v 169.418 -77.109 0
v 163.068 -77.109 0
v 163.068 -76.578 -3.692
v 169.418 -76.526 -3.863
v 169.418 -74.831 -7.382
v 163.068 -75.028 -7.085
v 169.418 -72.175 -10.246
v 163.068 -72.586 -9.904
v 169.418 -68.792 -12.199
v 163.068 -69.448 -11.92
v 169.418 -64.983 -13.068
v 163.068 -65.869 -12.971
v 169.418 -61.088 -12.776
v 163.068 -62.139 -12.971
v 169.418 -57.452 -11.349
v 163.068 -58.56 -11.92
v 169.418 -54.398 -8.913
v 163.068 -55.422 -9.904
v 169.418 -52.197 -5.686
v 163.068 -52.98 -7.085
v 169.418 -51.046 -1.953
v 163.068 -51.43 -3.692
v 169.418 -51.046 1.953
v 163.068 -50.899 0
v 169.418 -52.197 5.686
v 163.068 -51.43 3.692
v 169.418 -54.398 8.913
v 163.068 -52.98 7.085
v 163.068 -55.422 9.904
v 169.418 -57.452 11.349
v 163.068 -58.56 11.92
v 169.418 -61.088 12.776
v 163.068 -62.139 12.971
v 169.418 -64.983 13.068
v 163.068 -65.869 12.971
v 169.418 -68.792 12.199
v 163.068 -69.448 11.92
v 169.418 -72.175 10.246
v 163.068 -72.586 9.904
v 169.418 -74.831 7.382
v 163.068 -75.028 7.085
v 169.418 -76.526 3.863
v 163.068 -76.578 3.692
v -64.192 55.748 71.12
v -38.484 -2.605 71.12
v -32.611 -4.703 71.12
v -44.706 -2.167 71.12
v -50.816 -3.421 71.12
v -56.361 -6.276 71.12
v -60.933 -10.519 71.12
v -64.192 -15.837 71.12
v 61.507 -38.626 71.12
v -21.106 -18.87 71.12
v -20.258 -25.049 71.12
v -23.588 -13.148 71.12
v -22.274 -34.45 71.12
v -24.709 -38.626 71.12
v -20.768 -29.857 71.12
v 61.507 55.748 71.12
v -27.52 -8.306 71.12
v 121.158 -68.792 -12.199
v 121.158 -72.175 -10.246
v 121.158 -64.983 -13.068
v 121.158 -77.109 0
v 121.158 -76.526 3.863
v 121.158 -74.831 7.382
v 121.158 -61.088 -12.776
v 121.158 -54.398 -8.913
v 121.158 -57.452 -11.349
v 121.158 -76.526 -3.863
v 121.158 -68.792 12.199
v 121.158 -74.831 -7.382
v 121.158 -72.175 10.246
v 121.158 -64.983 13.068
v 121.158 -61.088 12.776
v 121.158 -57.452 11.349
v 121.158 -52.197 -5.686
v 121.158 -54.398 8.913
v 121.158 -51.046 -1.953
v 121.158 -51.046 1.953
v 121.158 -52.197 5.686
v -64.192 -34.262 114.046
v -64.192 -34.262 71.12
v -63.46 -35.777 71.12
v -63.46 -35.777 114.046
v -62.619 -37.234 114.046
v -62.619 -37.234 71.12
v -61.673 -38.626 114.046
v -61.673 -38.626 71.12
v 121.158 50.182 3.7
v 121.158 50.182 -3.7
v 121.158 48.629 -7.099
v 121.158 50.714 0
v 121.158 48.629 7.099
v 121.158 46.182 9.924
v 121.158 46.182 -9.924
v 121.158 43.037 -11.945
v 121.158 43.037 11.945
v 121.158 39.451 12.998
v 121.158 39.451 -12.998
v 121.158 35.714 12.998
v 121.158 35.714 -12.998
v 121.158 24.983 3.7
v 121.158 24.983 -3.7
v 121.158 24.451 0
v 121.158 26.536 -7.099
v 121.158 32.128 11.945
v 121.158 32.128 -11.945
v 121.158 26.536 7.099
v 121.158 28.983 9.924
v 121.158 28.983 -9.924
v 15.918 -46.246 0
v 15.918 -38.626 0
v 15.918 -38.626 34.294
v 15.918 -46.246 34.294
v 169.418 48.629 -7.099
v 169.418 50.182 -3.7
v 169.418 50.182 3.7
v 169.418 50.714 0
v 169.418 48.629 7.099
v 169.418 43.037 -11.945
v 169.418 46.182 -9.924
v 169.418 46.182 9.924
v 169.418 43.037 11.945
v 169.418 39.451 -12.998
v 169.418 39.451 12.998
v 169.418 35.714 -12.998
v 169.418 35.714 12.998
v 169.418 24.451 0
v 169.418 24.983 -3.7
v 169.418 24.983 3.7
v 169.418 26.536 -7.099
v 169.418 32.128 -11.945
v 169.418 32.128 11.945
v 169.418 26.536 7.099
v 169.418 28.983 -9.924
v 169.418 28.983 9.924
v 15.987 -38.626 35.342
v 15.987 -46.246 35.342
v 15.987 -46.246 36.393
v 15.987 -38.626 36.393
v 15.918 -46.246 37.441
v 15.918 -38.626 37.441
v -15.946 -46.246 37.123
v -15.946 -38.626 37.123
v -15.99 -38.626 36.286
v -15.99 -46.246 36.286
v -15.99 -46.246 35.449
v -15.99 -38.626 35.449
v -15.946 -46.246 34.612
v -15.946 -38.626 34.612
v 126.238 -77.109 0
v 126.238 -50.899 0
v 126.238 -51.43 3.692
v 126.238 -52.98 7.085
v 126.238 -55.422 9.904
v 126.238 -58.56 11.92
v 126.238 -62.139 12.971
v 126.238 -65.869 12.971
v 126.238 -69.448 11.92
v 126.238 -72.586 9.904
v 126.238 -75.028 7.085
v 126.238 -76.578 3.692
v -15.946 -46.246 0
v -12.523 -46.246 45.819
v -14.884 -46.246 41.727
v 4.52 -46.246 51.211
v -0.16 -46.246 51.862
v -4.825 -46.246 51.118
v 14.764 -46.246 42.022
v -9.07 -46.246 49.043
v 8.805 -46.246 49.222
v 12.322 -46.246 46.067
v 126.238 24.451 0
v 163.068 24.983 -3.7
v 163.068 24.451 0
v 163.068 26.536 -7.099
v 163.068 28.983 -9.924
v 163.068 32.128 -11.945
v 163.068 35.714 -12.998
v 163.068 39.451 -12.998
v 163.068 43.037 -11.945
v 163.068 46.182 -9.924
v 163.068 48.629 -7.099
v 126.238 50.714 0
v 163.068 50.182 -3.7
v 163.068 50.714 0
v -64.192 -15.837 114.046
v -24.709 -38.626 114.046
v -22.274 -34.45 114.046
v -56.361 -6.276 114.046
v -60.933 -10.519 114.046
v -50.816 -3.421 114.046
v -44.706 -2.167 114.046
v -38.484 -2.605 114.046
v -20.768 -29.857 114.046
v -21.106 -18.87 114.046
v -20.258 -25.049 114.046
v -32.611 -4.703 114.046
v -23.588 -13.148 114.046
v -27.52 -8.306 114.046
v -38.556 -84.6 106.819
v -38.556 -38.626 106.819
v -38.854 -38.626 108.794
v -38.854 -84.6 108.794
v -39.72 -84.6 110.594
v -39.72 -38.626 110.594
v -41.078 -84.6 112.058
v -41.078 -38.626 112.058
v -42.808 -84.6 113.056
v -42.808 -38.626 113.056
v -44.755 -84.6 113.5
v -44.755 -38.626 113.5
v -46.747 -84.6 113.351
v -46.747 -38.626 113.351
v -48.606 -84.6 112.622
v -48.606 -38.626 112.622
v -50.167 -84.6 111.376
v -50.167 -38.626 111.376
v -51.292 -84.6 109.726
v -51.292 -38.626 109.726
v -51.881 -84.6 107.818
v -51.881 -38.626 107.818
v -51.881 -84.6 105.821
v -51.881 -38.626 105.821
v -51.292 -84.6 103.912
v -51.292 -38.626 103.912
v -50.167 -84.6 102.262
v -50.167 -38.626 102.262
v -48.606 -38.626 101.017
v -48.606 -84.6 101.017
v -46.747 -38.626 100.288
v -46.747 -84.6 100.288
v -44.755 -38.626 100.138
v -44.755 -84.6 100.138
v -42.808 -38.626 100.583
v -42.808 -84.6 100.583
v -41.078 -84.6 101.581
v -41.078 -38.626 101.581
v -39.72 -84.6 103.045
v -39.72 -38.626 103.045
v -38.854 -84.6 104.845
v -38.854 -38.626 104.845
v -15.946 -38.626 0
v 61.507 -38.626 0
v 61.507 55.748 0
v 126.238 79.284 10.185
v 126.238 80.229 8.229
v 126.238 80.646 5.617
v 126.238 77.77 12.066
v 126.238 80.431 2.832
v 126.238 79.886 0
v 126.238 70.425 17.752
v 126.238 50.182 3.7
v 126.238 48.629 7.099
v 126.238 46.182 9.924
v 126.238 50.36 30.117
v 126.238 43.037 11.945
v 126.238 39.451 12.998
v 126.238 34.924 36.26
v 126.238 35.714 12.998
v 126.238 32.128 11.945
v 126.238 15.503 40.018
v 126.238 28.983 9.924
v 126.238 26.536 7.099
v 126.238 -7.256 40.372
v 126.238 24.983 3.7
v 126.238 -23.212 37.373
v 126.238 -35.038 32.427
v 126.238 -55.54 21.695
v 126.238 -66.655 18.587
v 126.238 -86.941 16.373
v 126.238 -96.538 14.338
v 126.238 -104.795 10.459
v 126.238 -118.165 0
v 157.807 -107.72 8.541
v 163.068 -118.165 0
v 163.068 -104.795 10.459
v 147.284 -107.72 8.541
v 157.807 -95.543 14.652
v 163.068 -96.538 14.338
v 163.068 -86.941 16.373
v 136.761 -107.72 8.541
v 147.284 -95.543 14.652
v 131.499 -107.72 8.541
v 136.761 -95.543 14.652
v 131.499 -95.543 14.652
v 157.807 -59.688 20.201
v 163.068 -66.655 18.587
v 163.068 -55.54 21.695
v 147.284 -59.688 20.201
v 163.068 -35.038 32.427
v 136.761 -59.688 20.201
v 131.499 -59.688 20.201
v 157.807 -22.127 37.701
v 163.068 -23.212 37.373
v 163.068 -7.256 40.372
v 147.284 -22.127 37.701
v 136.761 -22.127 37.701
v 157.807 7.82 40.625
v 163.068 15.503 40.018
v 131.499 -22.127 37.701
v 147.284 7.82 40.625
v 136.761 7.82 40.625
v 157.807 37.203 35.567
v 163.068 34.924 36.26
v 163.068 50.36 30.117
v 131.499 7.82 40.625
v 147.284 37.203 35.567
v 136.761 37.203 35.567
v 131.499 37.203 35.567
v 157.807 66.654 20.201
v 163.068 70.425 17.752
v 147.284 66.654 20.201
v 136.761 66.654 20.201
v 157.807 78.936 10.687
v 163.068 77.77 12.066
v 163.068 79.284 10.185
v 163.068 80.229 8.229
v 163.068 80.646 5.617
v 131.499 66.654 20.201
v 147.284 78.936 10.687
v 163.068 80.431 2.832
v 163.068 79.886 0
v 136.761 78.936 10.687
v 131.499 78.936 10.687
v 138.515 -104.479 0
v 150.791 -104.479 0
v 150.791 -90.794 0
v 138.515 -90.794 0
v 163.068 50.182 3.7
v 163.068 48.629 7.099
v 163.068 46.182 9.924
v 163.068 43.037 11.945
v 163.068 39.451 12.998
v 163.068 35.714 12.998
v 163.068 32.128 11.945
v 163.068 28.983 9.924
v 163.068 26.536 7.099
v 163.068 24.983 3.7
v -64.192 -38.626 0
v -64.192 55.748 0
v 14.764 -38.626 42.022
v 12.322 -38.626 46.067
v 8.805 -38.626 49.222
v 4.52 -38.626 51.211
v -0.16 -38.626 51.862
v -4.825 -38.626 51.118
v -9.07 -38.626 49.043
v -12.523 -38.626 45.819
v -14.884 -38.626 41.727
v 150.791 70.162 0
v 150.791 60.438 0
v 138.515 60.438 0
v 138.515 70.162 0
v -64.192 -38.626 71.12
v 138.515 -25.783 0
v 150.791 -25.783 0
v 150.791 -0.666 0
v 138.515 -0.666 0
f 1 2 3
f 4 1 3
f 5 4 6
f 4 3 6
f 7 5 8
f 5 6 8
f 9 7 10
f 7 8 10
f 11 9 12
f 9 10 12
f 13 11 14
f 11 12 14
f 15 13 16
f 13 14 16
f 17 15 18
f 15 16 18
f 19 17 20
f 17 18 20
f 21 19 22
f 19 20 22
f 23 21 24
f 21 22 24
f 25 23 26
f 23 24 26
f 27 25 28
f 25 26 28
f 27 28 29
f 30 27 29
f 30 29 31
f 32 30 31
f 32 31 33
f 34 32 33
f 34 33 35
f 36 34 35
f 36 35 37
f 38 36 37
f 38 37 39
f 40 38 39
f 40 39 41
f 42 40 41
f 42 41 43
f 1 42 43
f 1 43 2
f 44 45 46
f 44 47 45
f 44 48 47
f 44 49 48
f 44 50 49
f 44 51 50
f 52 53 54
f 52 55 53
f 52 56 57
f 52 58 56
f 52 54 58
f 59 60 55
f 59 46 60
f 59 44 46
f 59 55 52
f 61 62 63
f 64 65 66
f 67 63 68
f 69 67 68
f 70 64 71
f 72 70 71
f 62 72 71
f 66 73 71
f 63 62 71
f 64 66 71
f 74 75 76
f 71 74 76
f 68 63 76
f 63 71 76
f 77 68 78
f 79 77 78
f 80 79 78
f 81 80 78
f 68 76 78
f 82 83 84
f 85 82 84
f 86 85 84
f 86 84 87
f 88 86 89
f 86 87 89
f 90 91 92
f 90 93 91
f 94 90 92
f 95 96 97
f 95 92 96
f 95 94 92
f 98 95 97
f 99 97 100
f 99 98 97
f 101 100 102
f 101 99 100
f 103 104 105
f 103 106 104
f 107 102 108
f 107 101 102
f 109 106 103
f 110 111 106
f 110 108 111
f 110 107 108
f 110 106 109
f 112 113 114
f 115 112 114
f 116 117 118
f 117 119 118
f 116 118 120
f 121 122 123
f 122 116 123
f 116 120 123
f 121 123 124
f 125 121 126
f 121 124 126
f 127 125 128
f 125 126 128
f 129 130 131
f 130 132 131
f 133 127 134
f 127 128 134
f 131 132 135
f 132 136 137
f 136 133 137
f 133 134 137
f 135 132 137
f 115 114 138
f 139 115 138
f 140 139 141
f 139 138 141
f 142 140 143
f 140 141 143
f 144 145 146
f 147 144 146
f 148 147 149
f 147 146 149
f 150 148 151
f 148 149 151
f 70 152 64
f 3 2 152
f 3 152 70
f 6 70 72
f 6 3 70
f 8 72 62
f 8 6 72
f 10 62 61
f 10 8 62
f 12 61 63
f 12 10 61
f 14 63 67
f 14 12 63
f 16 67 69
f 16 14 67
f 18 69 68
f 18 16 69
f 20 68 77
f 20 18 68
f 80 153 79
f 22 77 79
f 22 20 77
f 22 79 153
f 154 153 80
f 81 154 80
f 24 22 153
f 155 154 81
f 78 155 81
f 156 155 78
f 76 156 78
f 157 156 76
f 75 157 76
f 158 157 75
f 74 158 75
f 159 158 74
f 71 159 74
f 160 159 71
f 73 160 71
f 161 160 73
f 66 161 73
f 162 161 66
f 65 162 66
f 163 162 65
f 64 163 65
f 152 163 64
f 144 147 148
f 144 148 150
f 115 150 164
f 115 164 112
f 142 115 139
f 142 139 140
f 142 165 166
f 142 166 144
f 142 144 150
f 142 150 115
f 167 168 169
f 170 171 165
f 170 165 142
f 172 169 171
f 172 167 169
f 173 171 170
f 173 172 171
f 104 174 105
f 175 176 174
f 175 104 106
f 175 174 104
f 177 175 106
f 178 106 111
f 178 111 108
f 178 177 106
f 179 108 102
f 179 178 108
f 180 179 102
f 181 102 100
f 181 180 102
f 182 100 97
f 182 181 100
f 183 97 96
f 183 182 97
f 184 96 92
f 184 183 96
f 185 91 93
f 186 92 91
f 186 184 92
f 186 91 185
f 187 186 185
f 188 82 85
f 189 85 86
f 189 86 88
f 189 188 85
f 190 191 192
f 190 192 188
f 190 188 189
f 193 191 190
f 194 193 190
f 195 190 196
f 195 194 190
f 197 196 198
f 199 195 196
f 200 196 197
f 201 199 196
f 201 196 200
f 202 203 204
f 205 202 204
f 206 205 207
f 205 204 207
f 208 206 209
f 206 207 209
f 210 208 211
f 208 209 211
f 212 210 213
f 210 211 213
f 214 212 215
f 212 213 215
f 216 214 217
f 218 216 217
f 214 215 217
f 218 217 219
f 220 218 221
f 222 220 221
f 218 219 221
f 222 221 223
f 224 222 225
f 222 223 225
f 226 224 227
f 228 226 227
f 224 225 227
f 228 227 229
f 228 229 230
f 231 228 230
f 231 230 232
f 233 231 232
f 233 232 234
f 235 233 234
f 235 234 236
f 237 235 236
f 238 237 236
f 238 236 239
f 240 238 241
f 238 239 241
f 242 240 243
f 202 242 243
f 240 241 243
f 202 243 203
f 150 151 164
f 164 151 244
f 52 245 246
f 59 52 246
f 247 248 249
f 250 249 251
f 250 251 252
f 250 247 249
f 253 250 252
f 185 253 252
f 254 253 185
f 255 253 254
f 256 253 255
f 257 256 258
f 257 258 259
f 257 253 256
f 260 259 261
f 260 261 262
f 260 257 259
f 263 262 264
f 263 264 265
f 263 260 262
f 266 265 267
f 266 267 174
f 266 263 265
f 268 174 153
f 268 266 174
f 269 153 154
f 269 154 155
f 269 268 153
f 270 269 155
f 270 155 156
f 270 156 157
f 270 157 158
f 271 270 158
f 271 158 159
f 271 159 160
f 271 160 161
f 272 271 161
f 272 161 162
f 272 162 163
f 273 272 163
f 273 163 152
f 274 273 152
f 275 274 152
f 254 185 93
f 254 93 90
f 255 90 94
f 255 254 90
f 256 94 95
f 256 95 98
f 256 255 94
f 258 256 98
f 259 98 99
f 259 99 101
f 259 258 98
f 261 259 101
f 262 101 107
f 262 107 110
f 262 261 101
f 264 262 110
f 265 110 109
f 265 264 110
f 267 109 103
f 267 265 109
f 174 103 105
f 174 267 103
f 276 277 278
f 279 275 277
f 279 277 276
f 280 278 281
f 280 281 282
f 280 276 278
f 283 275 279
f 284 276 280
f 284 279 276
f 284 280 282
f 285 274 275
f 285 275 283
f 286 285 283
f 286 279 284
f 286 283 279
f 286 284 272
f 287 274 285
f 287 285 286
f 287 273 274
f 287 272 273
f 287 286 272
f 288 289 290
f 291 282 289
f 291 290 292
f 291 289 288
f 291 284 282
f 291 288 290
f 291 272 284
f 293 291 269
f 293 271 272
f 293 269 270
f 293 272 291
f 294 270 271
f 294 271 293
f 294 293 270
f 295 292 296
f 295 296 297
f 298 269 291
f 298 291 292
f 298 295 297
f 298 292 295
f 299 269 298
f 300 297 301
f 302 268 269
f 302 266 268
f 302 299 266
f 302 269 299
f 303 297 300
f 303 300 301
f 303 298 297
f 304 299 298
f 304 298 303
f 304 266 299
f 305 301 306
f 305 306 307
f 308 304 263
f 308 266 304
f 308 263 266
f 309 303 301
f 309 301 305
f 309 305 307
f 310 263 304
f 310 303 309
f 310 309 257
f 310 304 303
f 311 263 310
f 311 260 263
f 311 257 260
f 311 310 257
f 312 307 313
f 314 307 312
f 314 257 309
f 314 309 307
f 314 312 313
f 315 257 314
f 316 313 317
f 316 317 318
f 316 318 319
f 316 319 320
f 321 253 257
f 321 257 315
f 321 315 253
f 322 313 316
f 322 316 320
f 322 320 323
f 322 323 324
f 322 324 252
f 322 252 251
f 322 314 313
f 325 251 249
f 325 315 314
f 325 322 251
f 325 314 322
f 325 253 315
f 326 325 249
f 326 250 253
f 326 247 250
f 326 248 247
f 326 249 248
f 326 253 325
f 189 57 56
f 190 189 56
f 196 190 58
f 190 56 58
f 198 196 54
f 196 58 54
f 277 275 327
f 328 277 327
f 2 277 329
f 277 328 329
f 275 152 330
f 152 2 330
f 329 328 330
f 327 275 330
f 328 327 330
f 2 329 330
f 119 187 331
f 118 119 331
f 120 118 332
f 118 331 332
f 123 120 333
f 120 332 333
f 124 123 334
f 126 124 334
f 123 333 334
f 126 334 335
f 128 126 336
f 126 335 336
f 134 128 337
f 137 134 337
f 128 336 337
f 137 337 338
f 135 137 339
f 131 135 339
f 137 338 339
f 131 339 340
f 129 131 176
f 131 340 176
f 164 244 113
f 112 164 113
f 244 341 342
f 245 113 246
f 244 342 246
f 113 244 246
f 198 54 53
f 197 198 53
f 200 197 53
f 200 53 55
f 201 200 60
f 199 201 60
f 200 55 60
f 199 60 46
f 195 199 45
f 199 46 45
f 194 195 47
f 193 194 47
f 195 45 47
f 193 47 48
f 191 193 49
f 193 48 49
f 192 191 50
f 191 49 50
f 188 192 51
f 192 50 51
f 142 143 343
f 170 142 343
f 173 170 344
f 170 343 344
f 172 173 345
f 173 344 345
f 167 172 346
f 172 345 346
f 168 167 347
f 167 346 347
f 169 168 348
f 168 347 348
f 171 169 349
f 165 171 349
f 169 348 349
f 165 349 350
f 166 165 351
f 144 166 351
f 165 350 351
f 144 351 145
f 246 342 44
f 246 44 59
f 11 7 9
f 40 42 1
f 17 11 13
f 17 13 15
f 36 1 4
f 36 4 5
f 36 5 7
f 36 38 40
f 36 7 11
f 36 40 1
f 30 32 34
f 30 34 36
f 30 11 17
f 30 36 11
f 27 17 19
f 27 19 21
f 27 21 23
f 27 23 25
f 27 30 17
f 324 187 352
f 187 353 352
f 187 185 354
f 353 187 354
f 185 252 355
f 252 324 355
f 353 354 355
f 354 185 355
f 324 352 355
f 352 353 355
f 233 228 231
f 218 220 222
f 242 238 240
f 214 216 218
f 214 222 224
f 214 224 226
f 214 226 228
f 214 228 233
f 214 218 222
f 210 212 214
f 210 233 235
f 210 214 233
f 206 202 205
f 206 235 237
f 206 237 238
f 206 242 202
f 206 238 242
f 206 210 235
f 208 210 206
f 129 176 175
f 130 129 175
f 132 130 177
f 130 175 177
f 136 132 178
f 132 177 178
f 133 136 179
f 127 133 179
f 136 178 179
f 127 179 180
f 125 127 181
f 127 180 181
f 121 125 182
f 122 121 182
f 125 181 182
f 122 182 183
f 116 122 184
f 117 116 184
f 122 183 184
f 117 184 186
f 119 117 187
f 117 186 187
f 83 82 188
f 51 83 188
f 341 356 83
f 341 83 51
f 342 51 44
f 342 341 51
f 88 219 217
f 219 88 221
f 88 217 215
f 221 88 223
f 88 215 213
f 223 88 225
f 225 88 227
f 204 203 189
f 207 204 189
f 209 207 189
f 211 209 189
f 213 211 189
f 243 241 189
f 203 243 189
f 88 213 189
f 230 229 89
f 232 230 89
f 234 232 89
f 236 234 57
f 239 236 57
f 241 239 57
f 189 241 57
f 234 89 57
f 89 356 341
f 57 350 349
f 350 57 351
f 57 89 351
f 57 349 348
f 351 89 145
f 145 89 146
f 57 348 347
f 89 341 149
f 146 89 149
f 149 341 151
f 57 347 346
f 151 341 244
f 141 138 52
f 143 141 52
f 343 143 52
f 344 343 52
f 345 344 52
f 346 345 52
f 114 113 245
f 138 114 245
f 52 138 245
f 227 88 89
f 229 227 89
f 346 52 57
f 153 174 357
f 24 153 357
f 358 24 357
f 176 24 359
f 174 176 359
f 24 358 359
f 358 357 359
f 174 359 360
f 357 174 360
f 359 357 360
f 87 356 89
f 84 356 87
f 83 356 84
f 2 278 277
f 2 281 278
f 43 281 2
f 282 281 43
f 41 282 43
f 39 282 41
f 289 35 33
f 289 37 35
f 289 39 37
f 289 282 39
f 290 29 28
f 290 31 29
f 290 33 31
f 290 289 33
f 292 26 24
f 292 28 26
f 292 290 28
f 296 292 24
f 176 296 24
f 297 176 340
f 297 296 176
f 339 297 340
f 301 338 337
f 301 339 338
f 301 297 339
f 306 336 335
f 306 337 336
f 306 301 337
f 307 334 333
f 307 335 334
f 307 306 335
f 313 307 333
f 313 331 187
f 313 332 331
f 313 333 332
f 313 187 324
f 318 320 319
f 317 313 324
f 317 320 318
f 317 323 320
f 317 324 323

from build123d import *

# Parameters (mm, degrees)
F0_W           = 125.6985701621
F0_H           = 94.37424317
F1_DEPTH       = 71.12
F3_DEPTH       = 7.62
F5_DEPTH       = 42.926
F6_R           = 6.6998463105
F7_DEPTH       = 45.974
F10_DEPTH      = 36.83
F12_DEPTH      = 41.91
F12_DEPTH_BACK = 6.35


with BuildPart() as f1:
    # F0 (on Top) → F1 (new body)
    with BuildSketch(Plane.XY):
        with Locations((-1.3424884528, 8.5609909147)):
            Rectangle(F0_W, F0_H)
    extrude(amount=F1_DEPTH)

    # F2 (on face) → F3 (join)
    with BuildSketch(Plane.XZ.offset(38.6261306703)):
        with BuildLine():
            Line((15.9182339085, 37.4408234342), (15.9182339085, 34.2940743581))
            ThreePointArc((15.9182339085, 34.2940743581), (15.9958018931, 35.8674488962), (15.9182339085, 37.4408234342))
        make_face()
        with BuildLine():
            Line((15.9182339085, 0), (15.9182339085, 34.2940743581))
            Line((15.9182339085, 34.2940743581), (15.9182339085, 37.4408234342))
            ThreePointArc((15.9182339085, 37.4408234342), (-0.1595166751, 51.8624553868), (-15.9464469133, 37.1230400097))
            Line((-15.9464469133, 37.1230400097), (-15.9464469133, 34.6118577826))
            Line((-15.9464469133, 34.6118577826), (-15.9464469133, 0))
            Line((-15.9464469133, 0), (15.9182339085, 0))
        make_face()
        with BuildLine():
            Line((-15.9464469133, 34.6118577826), (-15.9464469133, 37.1230400097))
            ThreePointArc((-15.9464469133, 37.1230400097), (-15.9958018931, 35.8674488962), (-15.9464469133, 34.6118577826))
        make_face()
    extrude(amount=F3_DEPTH)

    # F4 (on face) → F5 (join)
    with BuildSketch(Plane.XY.offset(71.12)):
        with BuildLine():
            ThreePointArc((-24.7089412616, -38.6261306703), (-21.3991816992, -32.1931757033), (-20.2580750936, -25.04927665))
            ThreePointArc((-20.2580750936, -25.04927665), (-38.4843703373, -2.6046738775), (-64.1917735338, -15.8367354256))
            Line((-64.1917735338, -15.8367354256), (-64.1917735338, -34.2618178743))
            ThreePointArc((-64.1917735338, -34.2618178743), (-63.0524764581, -36.5133755378), (-61.672702749, -38.6261306703))
            Line((-61.672702749, -38.6261306703), (-24.7089412616, -38.6261306703))
        make_face()
    extrude(amount=F5_DEPTH)

    # F6 (on face) → F7 (join)
    with BuildSketch(Plane.XZ.offset(38.6261306703)):
        with Locations((-45.255728066, 106.8193688989)):
            Circle(F6_R)
    extrude(amount=F7_DEPTH)


with BuildPart() as f10:
    # F9 (on offset) → F10 (new body)
    with BuildSketch(Plane.YZ.offset(126.238)):
        with BuildLine():
            add(Edge.make_bspline(
                [(-118.1647330523, 0), (-111.3943123905, 5.9643104463), (-96.7687703267, 18.8484837751), (-56.7744643499, 15.3249723815), (-24.7729904377, 44.4988288222), (38.460207848, 39.5774879774), (64.7590483897, 21.1043497126), (82.1158191607, 10.5659729542), (80.5463853376, 3.1284933557), (79.8862203956, 0)],
                knots=[0, 0, 0, 0, 0.135573185, 0.2928667831, 0.4609684124, 0.6621783296, 0.8126885703, 0.9212095233, 1, 1, 1, 1], degree=3))
            add(Edge.make_bspline(
                [(-118.1647330523, 0), (-52.1477485696, 0), (13.869235913, 0), (79.8862203956, 0)],
                knots=[0, 0, 0, 0, 198.0509534478, 198.0509534478, 198.0509534478, 198.0509534478], degree=3))
        make_face()
    extrude(amount=F10_DEPTH)

    # F11 (on face) → F12 (join, two sides)
    with BuildSketch(Plane.YZ.offset(163.068)) as f12_sk:
        with BuildLine():
            add(Edge.make_bspline(
                [(-77.108502472, 0), (-68.3721502902, 0), (-59.6357981084, 0), (-50.8994459266, 0)],
                knots=[41.0562305803, 41.0562305803, 41.0562305803, 41.0562305803, 67.2652871257, 67.2652871257, 67.2652871257, 67.2652871257], degree=3))
            ThreePointArc((-50.8994459266, 0), (-64.0039741993, 13.1045282727), (-77.108502472, 0))
        make_face()
        with BuildLine():
            ThreePointArc((-77.108502472, 0), (-64.0039741993, -13.1045282727), (-50.8994459266, 0))
            add(Edge.make_bspline(
                [(-77.108502472, 0), (-68.3721502902, 0), (-59.6357981084, 0), (-50.8994459266, 0)],
                knots=[41.0562305803, 41.0562305803, 41.0562305803, 41.0562305803, 67.2652871257, 67.2652871257, 67.2652871257, 67.2652871257], degree=3))
        make_face()
        with BuildLine():
            add(Edge.make_bspline(
                [(24.4511429628, 0), (33.205387134, 0), (41.9596313053, 0), (50.7138754765, 0)],
                knots=[142.6158760151, 142.6158760151, 142.6158760151, 142.6158760151, 168.8786085287, 168.8786085287, 168.8786085287, 168.8786085287], degree=3))
            ThreePointArc((24.4511429628, 0), (37.5825092196, -13.1313662568), (50.7138754765, 0))
        make_face()
        with BuildLine():
            ThreePointArc((50.7138754765, 0), (37.5825092196, 13.1313662568), (24.4511429628, 0))
            add(Edge.make_bspline(
                [(24.4511429628, 0), (33.205387134, 0), (41.9596313053, 0), (50.7138754765, 0)],
                knots=[142.6158760151, 142.6158760151, 142.6158760151, 142.6158760151, 168.8786085287, 168.8786085287, 168.8786085287, 168.8786085287], degree=3))
        make_face()
    extrude(amount=-F12_DEPTH)
    extrude(f12_sk.sketch, amount=F12_DEPTH_BACK)


solid = Compound([f1.part, f10.part])
